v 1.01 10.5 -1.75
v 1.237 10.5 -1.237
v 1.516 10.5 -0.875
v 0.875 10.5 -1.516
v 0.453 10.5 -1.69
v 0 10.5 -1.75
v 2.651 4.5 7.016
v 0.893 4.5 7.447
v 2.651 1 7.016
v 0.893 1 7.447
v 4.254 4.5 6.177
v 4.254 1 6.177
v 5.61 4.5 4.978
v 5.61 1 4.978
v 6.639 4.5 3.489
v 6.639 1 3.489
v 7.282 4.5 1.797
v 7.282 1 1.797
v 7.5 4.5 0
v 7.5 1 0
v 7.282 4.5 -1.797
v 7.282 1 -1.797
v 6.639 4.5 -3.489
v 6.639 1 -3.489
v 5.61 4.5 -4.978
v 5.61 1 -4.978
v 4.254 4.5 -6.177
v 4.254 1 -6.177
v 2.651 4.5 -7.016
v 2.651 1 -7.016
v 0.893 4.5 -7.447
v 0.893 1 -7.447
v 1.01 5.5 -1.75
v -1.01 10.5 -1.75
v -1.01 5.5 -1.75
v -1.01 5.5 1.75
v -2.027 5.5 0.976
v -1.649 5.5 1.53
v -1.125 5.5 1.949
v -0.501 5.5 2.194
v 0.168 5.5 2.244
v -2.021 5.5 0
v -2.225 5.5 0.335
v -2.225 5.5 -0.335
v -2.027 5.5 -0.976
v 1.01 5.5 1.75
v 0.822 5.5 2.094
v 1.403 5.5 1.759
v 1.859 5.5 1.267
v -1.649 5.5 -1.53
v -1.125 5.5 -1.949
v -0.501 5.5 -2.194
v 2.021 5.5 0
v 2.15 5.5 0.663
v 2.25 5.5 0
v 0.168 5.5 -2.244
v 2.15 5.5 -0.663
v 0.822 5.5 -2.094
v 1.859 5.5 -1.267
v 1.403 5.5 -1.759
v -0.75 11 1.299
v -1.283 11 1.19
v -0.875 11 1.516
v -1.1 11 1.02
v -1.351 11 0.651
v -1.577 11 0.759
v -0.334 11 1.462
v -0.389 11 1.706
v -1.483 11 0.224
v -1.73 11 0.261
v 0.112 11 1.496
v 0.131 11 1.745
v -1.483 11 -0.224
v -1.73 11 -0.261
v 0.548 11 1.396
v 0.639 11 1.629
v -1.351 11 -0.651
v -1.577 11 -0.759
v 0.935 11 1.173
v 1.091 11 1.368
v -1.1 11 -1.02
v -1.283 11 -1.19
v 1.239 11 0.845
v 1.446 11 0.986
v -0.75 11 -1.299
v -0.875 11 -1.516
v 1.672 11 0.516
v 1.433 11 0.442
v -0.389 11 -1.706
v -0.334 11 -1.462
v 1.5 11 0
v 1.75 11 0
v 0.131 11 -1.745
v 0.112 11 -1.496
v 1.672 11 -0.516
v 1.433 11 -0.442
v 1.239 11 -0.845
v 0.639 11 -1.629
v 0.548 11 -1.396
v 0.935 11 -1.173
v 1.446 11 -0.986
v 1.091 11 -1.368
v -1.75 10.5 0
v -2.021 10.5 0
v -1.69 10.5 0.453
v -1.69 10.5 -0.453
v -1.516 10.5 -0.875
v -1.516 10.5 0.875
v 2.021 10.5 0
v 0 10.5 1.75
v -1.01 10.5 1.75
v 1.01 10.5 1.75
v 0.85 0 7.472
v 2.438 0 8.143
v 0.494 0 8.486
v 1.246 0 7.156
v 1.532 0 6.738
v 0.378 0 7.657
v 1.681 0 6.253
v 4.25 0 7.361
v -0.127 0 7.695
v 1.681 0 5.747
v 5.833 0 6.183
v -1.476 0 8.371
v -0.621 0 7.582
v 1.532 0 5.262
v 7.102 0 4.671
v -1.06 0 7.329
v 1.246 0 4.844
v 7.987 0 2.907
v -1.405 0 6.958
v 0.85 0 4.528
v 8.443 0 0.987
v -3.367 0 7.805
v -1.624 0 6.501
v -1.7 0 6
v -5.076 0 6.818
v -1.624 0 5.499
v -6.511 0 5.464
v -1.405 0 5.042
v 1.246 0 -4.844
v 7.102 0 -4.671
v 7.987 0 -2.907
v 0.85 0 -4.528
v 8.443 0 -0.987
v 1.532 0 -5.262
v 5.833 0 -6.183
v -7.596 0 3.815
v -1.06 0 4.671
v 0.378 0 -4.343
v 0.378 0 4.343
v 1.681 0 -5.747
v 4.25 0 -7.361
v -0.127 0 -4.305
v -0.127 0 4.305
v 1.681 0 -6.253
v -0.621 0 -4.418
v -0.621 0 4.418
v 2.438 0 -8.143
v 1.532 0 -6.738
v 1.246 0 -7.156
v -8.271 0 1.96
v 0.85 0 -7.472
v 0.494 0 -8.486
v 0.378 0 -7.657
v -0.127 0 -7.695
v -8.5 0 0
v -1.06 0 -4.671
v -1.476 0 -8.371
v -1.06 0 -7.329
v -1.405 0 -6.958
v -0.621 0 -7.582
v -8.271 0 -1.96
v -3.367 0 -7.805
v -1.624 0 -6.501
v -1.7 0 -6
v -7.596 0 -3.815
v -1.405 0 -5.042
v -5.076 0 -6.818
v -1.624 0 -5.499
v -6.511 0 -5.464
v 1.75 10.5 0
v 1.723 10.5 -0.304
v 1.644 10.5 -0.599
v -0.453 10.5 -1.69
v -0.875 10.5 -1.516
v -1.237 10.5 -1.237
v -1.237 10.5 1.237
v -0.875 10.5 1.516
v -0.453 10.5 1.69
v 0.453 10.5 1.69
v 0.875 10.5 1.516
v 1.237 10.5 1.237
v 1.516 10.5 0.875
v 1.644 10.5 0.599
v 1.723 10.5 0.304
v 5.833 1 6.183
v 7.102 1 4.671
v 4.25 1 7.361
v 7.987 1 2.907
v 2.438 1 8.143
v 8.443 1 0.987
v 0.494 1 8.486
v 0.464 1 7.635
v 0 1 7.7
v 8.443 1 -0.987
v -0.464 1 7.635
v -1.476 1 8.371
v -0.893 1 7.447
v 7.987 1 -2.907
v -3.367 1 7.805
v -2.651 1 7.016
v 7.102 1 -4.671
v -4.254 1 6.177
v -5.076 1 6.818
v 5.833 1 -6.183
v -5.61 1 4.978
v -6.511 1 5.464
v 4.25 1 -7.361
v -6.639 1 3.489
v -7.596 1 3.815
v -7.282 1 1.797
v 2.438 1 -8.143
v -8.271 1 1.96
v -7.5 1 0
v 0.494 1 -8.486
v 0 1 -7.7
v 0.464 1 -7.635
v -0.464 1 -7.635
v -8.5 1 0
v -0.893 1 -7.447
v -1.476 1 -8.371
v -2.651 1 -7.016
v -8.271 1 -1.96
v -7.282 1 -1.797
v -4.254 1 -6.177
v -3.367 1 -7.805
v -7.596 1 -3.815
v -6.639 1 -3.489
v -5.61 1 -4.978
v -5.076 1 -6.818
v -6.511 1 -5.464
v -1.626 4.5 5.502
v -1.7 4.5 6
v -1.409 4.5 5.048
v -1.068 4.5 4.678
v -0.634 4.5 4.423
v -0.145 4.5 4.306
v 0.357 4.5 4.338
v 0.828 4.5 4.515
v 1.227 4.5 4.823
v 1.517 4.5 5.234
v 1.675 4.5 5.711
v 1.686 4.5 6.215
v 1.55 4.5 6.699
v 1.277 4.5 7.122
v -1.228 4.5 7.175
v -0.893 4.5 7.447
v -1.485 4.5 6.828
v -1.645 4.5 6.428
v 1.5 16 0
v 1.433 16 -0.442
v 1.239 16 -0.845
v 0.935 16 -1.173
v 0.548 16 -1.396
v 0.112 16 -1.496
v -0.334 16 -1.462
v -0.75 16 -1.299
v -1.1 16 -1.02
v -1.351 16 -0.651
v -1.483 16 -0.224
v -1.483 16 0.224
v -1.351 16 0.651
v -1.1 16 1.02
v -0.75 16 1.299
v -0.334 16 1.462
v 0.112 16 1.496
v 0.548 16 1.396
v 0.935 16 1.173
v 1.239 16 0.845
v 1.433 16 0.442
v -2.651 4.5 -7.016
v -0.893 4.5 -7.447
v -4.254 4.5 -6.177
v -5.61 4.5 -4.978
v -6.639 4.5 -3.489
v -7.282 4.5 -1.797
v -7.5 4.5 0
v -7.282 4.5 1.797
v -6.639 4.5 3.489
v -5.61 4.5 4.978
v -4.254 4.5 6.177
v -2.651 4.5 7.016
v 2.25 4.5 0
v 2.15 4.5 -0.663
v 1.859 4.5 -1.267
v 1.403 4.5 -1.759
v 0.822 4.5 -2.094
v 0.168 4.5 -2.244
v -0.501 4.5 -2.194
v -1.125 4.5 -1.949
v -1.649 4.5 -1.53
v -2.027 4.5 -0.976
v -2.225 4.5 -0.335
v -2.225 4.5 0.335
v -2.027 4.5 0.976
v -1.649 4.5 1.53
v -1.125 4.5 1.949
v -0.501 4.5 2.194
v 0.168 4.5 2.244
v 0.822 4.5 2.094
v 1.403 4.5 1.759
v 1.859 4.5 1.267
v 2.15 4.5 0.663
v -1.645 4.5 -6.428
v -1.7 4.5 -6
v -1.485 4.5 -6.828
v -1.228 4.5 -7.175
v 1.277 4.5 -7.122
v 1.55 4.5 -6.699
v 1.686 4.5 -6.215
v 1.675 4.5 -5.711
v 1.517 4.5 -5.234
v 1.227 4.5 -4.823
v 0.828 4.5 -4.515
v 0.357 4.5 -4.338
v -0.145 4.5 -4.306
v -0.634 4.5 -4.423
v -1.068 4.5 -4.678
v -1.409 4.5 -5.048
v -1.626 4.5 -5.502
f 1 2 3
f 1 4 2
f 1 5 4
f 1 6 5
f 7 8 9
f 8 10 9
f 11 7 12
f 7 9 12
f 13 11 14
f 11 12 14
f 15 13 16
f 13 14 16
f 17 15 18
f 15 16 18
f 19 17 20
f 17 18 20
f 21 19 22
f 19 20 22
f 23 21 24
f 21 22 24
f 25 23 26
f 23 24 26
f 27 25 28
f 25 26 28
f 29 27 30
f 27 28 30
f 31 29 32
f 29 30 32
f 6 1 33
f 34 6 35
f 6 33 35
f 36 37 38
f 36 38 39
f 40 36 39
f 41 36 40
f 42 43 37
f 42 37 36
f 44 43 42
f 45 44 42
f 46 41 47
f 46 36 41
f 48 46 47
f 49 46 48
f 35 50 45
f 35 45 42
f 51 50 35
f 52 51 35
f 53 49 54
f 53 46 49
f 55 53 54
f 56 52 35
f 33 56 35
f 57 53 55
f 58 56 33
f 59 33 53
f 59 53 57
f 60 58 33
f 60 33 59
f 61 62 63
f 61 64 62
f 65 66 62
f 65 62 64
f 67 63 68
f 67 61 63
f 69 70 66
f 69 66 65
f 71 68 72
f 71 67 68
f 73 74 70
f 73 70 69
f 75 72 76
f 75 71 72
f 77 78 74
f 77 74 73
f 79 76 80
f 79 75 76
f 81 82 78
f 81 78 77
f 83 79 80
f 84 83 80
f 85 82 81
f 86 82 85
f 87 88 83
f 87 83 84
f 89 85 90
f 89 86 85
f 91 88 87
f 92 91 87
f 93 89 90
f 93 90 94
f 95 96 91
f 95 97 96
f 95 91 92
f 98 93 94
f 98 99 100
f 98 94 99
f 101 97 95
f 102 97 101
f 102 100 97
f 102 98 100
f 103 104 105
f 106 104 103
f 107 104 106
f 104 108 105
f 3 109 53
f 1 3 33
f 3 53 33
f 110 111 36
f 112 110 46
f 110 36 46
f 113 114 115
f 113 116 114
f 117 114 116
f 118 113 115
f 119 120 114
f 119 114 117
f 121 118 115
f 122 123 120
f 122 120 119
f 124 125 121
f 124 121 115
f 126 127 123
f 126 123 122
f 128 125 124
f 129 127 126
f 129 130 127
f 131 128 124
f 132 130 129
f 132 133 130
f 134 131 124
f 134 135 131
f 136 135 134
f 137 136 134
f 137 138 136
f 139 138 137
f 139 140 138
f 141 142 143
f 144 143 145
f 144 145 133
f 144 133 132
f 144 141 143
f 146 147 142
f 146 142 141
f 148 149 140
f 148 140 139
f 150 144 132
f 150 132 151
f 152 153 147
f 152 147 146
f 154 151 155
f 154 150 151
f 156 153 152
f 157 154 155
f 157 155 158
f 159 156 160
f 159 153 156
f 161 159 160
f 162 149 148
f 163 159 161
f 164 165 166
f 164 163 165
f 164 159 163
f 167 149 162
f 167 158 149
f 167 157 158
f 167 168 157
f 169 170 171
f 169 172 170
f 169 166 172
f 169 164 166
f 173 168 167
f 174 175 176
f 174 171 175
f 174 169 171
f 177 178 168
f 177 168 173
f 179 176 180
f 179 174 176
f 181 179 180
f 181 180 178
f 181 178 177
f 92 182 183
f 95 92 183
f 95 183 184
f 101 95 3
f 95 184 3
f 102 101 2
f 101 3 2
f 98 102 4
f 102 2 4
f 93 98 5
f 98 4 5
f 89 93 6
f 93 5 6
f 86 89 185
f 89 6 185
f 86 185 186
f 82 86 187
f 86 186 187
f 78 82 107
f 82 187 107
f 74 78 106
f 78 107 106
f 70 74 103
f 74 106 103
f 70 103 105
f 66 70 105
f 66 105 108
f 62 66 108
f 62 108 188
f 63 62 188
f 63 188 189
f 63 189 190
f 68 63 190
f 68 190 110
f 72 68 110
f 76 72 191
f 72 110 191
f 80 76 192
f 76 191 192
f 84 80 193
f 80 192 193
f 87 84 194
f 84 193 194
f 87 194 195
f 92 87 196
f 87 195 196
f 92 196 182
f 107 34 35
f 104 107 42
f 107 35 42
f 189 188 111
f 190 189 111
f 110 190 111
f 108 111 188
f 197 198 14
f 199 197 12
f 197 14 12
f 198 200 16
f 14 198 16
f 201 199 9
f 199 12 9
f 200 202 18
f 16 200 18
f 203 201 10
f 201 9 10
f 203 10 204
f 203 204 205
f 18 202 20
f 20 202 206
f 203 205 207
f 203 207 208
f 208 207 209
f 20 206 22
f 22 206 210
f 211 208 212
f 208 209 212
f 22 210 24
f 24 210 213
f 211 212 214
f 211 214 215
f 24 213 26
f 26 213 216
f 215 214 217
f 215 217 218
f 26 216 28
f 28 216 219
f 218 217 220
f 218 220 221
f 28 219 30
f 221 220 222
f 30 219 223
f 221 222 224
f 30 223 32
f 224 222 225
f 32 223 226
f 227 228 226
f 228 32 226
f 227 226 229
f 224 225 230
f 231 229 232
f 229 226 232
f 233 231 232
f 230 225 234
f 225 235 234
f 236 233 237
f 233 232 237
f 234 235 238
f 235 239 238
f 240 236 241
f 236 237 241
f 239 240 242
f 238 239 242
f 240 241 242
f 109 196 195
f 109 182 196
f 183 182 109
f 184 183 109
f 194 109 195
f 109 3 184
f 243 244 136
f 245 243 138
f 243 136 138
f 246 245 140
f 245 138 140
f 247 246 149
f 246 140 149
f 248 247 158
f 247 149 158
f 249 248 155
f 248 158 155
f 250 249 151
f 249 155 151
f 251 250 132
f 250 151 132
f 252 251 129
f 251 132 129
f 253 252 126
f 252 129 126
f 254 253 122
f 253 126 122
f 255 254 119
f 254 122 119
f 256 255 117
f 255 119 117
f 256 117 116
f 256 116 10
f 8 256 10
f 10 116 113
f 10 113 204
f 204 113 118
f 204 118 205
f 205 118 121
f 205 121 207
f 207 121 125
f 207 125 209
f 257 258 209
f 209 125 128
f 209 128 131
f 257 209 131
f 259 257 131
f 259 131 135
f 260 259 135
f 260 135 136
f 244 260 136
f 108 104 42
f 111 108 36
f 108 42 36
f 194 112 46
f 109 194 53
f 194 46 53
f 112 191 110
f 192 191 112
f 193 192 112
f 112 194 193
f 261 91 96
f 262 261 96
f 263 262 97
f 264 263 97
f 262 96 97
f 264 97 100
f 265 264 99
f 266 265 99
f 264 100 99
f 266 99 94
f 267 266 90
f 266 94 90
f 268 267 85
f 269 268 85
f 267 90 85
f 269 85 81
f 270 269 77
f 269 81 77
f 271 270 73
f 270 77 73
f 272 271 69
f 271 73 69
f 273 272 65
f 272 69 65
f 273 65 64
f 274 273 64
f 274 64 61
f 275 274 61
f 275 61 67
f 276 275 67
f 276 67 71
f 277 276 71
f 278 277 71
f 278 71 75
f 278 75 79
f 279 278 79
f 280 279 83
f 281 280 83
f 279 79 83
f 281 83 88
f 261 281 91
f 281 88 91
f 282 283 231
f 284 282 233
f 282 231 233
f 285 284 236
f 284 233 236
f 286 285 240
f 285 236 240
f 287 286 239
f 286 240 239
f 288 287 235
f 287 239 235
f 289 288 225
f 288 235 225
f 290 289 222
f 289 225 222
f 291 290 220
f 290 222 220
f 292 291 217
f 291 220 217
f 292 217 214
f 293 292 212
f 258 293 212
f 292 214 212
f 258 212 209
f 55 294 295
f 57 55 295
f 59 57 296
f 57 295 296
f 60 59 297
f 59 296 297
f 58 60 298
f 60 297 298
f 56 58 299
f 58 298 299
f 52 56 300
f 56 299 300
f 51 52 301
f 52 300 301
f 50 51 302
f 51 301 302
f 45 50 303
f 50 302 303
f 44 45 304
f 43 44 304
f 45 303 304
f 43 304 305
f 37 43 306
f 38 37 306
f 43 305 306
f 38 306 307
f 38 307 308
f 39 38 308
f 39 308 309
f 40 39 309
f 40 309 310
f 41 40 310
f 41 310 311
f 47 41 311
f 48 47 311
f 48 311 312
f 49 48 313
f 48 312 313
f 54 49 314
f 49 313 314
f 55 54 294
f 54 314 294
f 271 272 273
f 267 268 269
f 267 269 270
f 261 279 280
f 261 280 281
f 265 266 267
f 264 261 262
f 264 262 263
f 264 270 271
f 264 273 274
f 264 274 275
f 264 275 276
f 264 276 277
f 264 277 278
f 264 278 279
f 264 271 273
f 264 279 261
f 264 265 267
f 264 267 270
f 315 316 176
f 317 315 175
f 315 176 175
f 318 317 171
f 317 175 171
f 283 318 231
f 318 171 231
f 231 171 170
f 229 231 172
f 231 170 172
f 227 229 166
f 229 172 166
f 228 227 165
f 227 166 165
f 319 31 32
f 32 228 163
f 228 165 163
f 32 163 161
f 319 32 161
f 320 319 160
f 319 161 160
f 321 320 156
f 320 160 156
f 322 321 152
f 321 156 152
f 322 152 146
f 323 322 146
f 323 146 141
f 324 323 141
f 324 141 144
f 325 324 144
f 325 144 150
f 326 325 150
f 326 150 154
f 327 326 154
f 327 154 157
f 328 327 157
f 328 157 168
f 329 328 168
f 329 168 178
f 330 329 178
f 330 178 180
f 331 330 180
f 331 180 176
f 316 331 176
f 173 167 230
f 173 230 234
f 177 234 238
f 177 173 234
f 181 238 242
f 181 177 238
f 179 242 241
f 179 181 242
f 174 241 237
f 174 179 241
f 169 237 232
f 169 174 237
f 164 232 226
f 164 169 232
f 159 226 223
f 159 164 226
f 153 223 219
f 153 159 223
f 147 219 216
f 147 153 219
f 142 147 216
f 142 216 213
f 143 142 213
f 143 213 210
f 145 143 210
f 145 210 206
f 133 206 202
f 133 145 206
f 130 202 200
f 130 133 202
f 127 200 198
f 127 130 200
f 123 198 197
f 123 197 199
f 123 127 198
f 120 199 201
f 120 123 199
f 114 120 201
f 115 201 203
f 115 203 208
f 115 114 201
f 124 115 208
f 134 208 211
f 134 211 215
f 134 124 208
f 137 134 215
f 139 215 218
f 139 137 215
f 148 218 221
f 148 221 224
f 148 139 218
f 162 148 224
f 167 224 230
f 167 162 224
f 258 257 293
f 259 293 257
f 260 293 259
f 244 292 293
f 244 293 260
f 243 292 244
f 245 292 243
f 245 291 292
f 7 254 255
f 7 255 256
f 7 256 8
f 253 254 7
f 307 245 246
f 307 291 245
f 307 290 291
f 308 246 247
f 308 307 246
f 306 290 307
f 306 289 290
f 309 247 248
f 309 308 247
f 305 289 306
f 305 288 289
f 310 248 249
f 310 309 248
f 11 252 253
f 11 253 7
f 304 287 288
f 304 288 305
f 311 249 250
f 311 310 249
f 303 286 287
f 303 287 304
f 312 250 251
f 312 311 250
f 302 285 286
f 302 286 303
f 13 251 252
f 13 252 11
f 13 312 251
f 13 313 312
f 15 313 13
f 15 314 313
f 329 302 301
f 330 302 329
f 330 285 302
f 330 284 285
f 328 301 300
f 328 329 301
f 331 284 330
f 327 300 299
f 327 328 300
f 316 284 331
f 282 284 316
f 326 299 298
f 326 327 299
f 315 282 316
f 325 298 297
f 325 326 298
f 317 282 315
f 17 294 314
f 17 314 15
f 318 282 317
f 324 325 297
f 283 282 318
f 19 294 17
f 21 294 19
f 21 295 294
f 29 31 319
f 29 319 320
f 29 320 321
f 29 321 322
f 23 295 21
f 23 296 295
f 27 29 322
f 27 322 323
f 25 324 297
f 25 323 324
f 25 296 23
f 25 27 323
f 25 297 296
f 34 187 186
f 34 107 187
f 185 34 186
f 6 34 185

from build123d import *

# Parameters (mm, degrees)
SKETCH_1_R         = 7.5
EXTRUDE_1_DEPTH    = 4.5
SKETCH_9_R         = 2.25
EXTRUDE_6_DEPTH    = 1
EXTRUDE_2_DEPTH    = 5
SKETCH_6_R         = 1.75
EXTRUDE_3_DEPTH    = 0.5
SKETCH_7_R         = 1.5
EXTRUDE_4_DEPTH    = 5
SKETCH_8_R         = 8.5
SKETCH_8_R_2       = 7.5
EXTRUDE_5_DEPTH    = 1
HOLE_WIZARD_M3_1_D = 3.4


with BuildPart() as part:
    # ｽｹｯﾁ1 → ﾎﾞｽ - 押し出し1 (new body)
    with BuildSketch(Plane(origin=(0, 0, 0), x_dir=(1, 0, 0), z_dir=(0, 1, 0))):
        Circle(SKETCH_1_R)
    extrude(amount=EXTRUDE_1_DEPTH)

    # ｽｹｯﾁ9 → ﾎﾞｽ - 押し出し6 (add)
    with BuildSketch(Plane(origin=(0, 4.5, 0), x_dir=(1, 0, 0), z_dir=(0, 1, 0))):
        Circle(SKETCH_9_R)
    extrude(amount=EXTRUDE_6_DEPTH)

    # ｽｹｯﾁ2 → ﾎﾞｽ - 押し出し2 (add)
    with BuildSketch(Plane(origin=(0, 5.5, 0), x_dir=(1, 0, 0), z_dir=(0, 1, 0))):
        Polygon((2.020725942, 0), (1.010362971, 1.75), (-1.010362971, 1.75), (-2.020725942, 0), (-1.010362971, -1.75), (1.010362971, -1.75), align=None)
    extrude(amount=EXTRUDE_2_DEPTH)

    # ｽｹｯﾁ6 → ﾎﾞｽ - 押し出し3 (add)
    with BuildSketch(Plane(origin=(0, 10.5, 0), x_dir=(1, 0, 0), z_dir=(0, 1, 0))):
        Circle(SKETCH_6_R)
    extrude(amount=EXTRUDE_3_DEPTH)

    # ｽｹｯﾁ7 → ﾎﾞｽ - 押し出し4 (add)
    with BuildSketch(Plane(origin=(0, 11, 0), x_dir=(1, 0, 0), z_dir=(0, 1, 0))):
        Circle(SKETCH_7_R)
    extrude(amount=EXTRUDE_4_DEPTH)

    # ｽｹｯﾁ8 → ﾎﾞｽ - 押し出し5 (add)
    with BuildSketch(Plane(origin=(0, 0, 0), x_dir=(-1, 0, 0), z_dir=(0, -1, 0))):
        Circle(SKETCH_8_R)
        Circle(SKETCH_8_R_2, mode=Mode.SUBTRACT)
    extrude(amount=-EXTRUDE_5_DEPTH)

    # M3 すきま穴1 (through all)
    with Locations(Plane(origin=(0, 4.5, 0), x_dir=(1, 0, 0), z_dir=(0, 1, 0))):
        with Locations((0, 6), (0, -6)):
            Hole(HOLE_WIZARD_M3_1_D / 2)


solid = part.part
